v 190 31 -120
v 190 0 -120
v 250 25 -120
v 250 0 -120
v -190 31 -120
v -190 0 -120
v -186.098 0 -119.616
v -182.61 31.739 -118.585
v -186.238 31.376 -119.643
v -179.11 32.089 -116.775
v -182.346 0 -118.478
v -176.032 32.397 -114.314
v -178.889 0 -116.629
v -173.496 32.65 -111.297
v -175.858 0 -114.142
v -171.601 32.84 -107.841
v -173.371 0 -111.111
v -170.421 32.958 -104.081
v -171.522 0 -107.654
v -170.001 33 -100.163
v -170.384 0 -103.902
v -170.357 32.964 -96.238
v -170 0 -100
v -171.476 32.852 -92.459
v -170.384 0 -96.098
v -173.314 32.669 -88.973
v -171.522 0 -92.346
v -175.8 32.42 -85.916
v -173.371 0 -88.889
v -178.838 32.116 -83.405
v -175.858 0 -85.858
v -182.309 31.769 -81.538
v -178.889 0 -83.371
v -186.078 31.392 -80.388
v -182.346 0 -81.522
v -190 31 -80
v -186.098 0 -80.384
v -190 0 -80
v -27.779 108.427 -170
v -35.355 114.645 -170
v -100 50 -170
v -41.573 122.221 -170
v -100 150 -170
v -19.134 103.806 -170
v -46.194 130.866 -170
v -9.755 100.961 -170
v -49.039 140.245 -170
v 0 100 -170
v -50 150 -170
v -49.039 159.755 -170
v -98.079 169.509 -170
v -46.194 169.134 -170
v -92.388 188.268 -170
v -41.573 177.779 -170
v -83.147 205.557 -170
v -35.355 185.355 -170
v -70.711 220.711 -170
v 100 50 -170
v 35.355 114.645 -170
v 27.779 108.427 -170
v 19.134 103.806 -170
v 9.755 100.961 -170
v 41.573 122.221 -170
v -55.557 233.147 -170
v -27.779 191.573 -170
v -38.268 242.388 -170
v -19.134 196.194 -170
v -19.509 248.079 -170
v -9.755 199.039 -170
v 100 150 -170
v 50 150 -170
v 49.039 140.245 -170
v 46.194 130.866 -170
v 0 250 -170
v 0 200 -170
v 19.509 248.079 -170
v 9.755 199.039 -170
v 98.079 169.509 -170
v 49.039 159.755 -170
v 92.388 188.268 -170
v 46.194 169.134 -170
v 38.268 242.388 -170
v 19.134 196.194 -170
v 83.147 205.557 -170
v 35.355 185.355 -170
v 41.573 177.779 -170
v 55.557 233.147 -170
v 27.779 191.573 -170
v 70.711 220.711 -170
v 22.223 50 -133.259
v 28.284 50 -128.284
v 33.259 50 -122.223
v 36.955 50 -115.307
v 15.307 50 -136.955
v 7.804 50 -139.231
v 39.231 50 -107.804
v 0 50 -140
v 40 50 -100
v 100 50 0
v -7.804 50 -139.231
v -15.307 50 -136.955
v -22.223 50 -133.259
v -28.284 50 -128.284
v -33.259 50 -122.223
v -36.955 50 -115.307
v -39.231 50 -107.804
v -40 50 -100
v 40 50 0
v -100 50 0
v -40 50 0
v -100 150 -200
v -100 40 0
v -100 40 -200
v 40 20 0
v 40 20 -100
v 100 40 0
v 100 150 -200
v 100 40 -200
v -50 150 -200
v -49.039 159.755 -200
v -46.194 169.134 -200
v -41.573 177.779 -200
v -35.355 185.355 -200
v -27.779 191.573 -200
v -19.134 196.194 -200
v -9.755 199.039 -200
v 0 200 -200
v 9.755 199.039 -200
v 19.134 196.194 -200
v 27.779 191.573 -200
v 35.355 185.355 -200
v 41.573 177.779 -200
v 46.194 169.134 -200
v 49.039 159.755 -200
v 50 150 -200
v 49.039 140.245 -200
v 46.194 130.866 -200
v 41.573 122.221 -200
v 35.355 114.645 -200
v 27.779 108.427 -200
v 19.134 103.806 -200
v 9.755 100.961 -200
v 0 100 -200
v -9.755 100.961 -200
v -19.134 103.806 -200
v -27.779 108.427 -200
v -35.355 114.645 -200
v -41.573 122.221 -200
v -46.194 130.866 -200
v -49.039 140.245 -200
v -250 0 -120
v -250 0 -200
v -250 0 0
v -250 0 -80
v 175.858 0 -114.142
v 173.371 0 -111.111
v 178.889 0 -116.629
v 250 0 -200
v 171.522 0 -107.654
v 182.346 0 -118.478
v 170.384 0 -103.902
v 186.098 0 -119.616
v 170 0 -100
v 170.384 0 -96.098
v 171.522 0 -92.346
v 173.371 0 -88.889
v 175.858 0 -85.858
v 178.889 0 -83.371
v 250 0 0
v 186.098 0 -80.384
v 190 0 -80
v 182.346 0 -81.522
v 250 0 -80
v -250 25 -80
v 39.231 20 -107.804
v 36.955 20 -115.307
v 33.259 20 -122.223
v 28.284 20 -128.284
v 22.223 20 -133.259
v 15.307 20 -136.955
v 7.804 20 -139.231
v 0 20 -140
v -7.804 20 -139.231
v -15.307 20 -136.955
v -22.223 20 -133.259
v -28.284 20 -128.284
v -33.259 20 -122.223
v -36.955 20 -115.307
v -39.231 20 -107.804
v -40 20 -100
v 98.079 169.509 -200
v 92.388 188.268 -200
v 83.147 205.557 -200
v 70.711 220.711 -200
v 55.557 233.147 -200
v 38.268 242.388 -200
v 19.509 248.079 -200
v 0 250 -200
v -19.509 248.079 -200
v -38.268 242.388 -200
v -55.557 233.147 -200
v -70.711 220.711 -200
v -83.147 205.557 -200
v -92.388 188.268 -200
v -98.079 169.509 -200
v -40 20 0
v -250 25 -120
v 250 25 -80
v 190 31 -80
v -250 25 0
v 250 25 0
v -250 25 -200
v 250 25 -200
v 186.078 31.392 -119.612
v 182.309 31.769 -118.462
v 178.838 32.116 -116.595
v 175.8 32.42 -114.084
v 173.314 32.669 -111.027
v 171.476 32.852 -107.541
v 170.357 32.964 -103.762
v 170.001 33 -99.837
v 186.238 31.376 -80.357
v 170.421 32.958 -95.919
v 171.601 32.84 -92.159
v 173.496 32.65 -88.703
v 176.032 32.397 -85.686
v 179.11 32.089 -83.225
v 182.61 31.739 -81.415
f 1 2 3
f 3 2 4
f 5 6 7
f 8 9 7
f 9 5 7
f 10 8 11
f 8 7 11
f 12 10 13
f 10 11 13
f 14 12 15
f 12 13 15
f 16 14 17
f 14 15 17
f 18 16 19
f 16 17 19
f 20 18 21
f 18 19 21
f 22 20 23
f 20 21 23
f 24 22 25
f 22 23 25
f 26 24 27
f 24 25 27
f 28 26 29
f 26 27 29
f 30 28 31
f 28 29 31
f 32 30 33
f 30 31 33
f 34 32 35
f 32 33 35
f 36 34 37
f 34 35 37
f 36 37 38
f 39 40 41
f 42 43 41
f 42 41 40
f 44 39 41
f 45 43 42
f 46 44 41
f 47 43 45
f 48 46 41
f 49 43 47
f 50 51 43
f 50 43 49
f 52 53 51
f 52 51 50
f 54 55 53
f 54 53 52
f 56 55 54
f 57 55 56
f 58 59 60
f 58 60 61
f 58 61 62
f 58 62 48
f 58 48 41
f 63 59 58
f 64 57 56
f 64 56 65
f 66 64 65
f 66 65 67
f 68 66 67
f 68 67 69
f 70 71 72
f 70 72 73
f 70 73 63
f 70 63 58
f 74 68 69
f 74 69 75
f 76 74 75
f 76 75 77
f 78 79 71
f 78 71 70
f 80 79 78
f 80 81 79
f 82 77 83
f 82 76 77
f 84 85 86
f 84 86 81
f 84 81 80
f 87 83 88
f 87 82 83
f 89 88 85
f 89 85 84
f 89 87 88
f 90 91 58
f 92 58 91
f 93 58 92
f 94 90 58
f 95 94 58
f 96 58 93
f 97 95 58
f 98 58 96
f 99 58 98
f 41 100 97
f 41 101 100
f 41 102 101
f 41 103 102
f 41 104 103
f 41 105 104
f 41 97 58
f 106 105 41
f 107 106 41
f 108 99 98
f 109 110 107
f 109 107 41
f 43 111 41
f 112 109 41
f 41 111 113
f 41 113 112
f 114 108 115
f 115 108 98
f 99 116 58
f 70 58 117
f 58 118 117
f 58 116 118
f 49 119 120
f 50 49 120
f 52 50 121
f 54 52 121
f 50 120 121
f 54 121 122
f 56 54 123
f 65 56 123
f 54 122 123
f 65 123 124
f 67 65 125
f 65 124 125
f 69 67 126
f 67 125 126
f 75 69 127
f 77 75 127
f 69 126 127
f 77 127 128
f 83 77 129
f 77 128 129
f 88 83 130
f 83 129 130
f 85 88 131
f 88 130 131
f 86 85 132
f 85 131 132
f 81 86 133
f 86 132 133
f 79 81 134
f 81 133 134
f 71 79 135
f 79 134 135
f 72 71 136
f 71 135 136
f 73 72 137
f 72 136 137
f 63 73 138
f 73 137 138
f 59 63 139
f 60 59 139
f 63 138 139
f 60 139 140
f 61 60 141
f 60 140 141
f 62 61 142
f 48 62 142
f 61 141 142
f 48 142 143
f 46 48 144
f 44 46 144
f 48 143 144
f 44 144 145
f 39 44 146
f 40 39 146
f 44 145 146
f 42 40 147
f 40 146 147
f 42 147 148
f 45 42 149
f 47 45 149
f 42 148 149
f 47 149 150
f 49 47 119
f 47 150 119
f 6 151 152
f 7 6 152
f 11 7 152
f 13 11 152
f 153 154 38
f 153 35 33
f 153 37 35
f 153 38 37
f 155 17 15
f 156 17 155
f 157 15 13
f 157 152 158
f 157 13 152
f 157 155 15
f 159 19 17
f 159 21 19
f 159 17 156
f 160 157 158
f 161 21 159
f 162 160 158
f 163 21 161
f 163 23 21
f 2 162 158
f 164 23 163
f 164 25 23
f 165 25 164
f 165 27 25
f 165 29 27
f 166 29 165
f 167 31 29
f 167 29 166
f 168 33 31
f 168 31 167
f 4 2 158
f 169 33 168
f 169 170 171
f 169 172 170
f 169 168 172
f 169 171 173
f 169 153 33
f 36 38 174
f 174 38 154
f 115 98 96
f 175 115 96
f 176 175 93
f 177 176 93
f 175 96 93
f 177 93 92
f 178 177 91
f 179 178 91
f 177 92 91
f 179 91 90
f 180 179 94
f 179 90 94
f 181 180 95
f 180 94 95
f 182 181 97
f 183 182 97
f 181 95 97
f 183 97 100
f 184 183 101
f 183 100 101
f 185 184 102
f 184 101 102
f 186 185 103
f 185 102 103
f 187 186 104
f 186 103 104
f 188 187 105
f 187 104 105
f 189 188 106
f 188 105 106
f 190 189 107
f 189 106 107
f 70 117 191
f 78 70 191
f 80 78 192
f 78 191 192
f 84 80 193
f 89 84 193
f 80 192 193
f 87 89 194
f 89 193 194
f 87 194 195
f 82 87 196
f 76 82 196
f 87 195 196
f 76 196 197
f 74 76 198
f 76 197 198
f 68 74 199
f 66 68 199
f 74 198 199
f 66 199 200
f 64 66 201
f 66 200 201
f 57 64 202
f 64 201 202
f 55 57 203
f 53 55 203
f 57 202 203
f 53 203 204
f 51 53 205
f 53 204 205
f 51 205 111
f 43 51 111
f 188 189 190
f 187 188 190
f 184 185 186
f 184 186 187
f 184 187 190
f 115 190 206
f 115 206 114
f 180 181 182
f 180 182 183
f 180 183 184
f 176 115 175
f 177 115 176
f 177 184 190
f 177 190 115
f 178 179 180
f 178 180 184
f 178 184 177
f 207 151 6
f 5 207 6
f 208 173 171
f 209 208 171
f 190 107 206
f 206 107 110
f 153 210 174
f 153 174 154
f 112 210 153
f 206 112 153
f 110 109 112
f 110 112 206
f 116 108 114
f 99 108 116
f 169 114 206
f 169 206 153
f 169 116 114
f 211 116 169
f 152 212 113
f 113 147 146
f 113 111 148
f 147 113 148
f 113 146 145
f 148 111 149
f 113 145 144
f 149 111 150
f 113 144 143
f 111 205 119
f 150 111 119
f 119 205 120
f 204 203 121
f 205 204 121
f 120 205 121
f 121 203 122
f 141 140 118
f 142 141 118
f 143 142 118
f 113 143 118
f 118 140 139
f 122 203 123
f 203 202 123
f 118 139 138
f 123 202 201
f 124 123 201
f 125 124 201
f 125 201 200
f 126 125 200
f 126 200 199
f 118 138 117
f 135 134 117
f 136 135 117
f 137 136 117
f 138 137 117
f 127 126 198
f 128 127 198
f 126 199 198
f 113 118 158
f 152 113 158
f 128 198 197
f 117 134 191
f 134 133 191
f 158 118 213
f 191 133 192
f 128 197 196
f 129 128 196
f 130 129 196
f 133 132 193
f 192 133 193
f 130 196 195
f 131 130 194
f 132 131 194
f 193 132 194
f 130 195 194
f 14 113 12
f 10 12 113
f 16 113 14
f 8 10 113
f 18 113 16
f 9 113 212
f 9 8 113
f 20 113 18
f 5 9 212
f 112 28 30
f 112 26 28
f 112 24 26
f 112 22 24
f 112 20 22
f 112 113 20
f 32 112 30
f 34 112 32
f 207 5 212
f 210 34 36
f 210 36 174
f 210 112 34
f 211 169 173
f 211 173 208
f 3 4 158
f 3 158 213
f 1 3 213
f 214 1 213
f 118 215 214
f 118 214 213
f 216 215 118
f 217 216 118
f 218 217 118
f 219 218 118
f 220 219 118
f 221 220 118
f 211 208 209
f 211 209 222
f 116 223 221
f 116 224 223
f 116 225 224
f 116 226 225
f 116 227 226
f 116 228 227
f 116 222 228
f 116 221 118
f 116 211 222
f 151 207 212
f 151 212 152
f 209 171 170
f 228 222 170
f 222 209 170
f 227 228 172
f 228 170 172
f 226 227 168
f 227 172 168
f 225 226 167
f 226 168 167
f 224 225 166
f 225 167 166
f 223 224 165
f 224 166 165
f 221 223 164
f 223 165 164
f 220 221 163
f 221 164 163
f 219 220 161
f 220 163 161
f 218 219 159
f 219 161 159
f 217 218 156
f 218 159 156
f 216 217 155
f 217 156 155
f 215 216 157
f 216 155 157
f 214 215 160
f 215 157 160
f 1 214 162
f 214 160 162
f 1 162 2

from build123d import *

# Parameters (mm, degrees)
BOSS_EXTRUDE1_DEPTH = 200
CUT_EXTRUDE1_DEPTH  = 30
CUT_EXTRUDE2_DEPTH  = 325.03703492
SKETCH5_R           = 50
BOSS_EXTRUDE2_DEPTH = 30


with BuildPart() as part:
    # Sketch2 → Boss-Extrude1 (new body)
    with BuildSketch(Plane.XY):
        Polygon((-250, 0), (250, 0), (250, 25), (100, 40), (100, 50), (-100, 50), (-100, 40), (-250, 25), align=None)
    extrude(amount=-BOSS_EXTRUDE1_DEPTH)

    # Sketch3 → Cut-Extrude1 (cut)
    with BuildSketch(Plane(origin=(0, 50, 0), x_dir=(1, 0, 0), z_dir=(0, 1, 0))):
        with BuildLine():
            Line((-40, 100), (-40, 0))
            Line((-40, 0), (40, 0))
            Line((40, 0), (40, 100))
            ThreePointArc((40, 100), (0, 140), (-40, 100))
        make_face()
    extrude(amount=-CUT_EXTRUDE1_DEPTH, mode=Mode.SUBTRACT)

    # Sketch4 → Cut-Extrude2 (cut, through all)
    with BuildSketch(Plane.XZ):
        with BuildLine():
            Line((-190, -80), (-250, -80))
            Line((-250, -80), (-250, -120))
            Line((-250, -120), (-190, -120))
            ThreePointArc((-190, -120), (-170, -100), (-190, -80))
        make_face()
        with BuildLine():
            Line((250, -120), (250, -80))
            Line((250, -80), (190, -80))
            ThreePointArc((190, -80), (170, -100), (190, -120))
            Line((190, -120), (250, -120))
        make_face()
    extrude(amount=-CUT_EXTRUDE2_DEPTH, mode=Mode.SUBTRACT)

    # Sketch5 → Boss-Extrude2 (add)
    with BuildSketch(Plane(origin=(0, 0, -200), x_dir=(-1, 0, 0), z_dir=(0, 0, -1))):
        with BuildLine():
            Line((-100, 50), (-100, 150))
            ThreePointArc((-100, 150), (0, 250), (100, 150))
            Line((100, 150), (100, 50))
            Line((100, 50), (-100, 50))
        make_face()
        with Locations((0, 150)):
            Circle(SKETCH5_R, mode=Mode.SUBTRACT)
    extrude(amount=-BOSS_EXTRUDE2_DEPTH)


solid = part.part
